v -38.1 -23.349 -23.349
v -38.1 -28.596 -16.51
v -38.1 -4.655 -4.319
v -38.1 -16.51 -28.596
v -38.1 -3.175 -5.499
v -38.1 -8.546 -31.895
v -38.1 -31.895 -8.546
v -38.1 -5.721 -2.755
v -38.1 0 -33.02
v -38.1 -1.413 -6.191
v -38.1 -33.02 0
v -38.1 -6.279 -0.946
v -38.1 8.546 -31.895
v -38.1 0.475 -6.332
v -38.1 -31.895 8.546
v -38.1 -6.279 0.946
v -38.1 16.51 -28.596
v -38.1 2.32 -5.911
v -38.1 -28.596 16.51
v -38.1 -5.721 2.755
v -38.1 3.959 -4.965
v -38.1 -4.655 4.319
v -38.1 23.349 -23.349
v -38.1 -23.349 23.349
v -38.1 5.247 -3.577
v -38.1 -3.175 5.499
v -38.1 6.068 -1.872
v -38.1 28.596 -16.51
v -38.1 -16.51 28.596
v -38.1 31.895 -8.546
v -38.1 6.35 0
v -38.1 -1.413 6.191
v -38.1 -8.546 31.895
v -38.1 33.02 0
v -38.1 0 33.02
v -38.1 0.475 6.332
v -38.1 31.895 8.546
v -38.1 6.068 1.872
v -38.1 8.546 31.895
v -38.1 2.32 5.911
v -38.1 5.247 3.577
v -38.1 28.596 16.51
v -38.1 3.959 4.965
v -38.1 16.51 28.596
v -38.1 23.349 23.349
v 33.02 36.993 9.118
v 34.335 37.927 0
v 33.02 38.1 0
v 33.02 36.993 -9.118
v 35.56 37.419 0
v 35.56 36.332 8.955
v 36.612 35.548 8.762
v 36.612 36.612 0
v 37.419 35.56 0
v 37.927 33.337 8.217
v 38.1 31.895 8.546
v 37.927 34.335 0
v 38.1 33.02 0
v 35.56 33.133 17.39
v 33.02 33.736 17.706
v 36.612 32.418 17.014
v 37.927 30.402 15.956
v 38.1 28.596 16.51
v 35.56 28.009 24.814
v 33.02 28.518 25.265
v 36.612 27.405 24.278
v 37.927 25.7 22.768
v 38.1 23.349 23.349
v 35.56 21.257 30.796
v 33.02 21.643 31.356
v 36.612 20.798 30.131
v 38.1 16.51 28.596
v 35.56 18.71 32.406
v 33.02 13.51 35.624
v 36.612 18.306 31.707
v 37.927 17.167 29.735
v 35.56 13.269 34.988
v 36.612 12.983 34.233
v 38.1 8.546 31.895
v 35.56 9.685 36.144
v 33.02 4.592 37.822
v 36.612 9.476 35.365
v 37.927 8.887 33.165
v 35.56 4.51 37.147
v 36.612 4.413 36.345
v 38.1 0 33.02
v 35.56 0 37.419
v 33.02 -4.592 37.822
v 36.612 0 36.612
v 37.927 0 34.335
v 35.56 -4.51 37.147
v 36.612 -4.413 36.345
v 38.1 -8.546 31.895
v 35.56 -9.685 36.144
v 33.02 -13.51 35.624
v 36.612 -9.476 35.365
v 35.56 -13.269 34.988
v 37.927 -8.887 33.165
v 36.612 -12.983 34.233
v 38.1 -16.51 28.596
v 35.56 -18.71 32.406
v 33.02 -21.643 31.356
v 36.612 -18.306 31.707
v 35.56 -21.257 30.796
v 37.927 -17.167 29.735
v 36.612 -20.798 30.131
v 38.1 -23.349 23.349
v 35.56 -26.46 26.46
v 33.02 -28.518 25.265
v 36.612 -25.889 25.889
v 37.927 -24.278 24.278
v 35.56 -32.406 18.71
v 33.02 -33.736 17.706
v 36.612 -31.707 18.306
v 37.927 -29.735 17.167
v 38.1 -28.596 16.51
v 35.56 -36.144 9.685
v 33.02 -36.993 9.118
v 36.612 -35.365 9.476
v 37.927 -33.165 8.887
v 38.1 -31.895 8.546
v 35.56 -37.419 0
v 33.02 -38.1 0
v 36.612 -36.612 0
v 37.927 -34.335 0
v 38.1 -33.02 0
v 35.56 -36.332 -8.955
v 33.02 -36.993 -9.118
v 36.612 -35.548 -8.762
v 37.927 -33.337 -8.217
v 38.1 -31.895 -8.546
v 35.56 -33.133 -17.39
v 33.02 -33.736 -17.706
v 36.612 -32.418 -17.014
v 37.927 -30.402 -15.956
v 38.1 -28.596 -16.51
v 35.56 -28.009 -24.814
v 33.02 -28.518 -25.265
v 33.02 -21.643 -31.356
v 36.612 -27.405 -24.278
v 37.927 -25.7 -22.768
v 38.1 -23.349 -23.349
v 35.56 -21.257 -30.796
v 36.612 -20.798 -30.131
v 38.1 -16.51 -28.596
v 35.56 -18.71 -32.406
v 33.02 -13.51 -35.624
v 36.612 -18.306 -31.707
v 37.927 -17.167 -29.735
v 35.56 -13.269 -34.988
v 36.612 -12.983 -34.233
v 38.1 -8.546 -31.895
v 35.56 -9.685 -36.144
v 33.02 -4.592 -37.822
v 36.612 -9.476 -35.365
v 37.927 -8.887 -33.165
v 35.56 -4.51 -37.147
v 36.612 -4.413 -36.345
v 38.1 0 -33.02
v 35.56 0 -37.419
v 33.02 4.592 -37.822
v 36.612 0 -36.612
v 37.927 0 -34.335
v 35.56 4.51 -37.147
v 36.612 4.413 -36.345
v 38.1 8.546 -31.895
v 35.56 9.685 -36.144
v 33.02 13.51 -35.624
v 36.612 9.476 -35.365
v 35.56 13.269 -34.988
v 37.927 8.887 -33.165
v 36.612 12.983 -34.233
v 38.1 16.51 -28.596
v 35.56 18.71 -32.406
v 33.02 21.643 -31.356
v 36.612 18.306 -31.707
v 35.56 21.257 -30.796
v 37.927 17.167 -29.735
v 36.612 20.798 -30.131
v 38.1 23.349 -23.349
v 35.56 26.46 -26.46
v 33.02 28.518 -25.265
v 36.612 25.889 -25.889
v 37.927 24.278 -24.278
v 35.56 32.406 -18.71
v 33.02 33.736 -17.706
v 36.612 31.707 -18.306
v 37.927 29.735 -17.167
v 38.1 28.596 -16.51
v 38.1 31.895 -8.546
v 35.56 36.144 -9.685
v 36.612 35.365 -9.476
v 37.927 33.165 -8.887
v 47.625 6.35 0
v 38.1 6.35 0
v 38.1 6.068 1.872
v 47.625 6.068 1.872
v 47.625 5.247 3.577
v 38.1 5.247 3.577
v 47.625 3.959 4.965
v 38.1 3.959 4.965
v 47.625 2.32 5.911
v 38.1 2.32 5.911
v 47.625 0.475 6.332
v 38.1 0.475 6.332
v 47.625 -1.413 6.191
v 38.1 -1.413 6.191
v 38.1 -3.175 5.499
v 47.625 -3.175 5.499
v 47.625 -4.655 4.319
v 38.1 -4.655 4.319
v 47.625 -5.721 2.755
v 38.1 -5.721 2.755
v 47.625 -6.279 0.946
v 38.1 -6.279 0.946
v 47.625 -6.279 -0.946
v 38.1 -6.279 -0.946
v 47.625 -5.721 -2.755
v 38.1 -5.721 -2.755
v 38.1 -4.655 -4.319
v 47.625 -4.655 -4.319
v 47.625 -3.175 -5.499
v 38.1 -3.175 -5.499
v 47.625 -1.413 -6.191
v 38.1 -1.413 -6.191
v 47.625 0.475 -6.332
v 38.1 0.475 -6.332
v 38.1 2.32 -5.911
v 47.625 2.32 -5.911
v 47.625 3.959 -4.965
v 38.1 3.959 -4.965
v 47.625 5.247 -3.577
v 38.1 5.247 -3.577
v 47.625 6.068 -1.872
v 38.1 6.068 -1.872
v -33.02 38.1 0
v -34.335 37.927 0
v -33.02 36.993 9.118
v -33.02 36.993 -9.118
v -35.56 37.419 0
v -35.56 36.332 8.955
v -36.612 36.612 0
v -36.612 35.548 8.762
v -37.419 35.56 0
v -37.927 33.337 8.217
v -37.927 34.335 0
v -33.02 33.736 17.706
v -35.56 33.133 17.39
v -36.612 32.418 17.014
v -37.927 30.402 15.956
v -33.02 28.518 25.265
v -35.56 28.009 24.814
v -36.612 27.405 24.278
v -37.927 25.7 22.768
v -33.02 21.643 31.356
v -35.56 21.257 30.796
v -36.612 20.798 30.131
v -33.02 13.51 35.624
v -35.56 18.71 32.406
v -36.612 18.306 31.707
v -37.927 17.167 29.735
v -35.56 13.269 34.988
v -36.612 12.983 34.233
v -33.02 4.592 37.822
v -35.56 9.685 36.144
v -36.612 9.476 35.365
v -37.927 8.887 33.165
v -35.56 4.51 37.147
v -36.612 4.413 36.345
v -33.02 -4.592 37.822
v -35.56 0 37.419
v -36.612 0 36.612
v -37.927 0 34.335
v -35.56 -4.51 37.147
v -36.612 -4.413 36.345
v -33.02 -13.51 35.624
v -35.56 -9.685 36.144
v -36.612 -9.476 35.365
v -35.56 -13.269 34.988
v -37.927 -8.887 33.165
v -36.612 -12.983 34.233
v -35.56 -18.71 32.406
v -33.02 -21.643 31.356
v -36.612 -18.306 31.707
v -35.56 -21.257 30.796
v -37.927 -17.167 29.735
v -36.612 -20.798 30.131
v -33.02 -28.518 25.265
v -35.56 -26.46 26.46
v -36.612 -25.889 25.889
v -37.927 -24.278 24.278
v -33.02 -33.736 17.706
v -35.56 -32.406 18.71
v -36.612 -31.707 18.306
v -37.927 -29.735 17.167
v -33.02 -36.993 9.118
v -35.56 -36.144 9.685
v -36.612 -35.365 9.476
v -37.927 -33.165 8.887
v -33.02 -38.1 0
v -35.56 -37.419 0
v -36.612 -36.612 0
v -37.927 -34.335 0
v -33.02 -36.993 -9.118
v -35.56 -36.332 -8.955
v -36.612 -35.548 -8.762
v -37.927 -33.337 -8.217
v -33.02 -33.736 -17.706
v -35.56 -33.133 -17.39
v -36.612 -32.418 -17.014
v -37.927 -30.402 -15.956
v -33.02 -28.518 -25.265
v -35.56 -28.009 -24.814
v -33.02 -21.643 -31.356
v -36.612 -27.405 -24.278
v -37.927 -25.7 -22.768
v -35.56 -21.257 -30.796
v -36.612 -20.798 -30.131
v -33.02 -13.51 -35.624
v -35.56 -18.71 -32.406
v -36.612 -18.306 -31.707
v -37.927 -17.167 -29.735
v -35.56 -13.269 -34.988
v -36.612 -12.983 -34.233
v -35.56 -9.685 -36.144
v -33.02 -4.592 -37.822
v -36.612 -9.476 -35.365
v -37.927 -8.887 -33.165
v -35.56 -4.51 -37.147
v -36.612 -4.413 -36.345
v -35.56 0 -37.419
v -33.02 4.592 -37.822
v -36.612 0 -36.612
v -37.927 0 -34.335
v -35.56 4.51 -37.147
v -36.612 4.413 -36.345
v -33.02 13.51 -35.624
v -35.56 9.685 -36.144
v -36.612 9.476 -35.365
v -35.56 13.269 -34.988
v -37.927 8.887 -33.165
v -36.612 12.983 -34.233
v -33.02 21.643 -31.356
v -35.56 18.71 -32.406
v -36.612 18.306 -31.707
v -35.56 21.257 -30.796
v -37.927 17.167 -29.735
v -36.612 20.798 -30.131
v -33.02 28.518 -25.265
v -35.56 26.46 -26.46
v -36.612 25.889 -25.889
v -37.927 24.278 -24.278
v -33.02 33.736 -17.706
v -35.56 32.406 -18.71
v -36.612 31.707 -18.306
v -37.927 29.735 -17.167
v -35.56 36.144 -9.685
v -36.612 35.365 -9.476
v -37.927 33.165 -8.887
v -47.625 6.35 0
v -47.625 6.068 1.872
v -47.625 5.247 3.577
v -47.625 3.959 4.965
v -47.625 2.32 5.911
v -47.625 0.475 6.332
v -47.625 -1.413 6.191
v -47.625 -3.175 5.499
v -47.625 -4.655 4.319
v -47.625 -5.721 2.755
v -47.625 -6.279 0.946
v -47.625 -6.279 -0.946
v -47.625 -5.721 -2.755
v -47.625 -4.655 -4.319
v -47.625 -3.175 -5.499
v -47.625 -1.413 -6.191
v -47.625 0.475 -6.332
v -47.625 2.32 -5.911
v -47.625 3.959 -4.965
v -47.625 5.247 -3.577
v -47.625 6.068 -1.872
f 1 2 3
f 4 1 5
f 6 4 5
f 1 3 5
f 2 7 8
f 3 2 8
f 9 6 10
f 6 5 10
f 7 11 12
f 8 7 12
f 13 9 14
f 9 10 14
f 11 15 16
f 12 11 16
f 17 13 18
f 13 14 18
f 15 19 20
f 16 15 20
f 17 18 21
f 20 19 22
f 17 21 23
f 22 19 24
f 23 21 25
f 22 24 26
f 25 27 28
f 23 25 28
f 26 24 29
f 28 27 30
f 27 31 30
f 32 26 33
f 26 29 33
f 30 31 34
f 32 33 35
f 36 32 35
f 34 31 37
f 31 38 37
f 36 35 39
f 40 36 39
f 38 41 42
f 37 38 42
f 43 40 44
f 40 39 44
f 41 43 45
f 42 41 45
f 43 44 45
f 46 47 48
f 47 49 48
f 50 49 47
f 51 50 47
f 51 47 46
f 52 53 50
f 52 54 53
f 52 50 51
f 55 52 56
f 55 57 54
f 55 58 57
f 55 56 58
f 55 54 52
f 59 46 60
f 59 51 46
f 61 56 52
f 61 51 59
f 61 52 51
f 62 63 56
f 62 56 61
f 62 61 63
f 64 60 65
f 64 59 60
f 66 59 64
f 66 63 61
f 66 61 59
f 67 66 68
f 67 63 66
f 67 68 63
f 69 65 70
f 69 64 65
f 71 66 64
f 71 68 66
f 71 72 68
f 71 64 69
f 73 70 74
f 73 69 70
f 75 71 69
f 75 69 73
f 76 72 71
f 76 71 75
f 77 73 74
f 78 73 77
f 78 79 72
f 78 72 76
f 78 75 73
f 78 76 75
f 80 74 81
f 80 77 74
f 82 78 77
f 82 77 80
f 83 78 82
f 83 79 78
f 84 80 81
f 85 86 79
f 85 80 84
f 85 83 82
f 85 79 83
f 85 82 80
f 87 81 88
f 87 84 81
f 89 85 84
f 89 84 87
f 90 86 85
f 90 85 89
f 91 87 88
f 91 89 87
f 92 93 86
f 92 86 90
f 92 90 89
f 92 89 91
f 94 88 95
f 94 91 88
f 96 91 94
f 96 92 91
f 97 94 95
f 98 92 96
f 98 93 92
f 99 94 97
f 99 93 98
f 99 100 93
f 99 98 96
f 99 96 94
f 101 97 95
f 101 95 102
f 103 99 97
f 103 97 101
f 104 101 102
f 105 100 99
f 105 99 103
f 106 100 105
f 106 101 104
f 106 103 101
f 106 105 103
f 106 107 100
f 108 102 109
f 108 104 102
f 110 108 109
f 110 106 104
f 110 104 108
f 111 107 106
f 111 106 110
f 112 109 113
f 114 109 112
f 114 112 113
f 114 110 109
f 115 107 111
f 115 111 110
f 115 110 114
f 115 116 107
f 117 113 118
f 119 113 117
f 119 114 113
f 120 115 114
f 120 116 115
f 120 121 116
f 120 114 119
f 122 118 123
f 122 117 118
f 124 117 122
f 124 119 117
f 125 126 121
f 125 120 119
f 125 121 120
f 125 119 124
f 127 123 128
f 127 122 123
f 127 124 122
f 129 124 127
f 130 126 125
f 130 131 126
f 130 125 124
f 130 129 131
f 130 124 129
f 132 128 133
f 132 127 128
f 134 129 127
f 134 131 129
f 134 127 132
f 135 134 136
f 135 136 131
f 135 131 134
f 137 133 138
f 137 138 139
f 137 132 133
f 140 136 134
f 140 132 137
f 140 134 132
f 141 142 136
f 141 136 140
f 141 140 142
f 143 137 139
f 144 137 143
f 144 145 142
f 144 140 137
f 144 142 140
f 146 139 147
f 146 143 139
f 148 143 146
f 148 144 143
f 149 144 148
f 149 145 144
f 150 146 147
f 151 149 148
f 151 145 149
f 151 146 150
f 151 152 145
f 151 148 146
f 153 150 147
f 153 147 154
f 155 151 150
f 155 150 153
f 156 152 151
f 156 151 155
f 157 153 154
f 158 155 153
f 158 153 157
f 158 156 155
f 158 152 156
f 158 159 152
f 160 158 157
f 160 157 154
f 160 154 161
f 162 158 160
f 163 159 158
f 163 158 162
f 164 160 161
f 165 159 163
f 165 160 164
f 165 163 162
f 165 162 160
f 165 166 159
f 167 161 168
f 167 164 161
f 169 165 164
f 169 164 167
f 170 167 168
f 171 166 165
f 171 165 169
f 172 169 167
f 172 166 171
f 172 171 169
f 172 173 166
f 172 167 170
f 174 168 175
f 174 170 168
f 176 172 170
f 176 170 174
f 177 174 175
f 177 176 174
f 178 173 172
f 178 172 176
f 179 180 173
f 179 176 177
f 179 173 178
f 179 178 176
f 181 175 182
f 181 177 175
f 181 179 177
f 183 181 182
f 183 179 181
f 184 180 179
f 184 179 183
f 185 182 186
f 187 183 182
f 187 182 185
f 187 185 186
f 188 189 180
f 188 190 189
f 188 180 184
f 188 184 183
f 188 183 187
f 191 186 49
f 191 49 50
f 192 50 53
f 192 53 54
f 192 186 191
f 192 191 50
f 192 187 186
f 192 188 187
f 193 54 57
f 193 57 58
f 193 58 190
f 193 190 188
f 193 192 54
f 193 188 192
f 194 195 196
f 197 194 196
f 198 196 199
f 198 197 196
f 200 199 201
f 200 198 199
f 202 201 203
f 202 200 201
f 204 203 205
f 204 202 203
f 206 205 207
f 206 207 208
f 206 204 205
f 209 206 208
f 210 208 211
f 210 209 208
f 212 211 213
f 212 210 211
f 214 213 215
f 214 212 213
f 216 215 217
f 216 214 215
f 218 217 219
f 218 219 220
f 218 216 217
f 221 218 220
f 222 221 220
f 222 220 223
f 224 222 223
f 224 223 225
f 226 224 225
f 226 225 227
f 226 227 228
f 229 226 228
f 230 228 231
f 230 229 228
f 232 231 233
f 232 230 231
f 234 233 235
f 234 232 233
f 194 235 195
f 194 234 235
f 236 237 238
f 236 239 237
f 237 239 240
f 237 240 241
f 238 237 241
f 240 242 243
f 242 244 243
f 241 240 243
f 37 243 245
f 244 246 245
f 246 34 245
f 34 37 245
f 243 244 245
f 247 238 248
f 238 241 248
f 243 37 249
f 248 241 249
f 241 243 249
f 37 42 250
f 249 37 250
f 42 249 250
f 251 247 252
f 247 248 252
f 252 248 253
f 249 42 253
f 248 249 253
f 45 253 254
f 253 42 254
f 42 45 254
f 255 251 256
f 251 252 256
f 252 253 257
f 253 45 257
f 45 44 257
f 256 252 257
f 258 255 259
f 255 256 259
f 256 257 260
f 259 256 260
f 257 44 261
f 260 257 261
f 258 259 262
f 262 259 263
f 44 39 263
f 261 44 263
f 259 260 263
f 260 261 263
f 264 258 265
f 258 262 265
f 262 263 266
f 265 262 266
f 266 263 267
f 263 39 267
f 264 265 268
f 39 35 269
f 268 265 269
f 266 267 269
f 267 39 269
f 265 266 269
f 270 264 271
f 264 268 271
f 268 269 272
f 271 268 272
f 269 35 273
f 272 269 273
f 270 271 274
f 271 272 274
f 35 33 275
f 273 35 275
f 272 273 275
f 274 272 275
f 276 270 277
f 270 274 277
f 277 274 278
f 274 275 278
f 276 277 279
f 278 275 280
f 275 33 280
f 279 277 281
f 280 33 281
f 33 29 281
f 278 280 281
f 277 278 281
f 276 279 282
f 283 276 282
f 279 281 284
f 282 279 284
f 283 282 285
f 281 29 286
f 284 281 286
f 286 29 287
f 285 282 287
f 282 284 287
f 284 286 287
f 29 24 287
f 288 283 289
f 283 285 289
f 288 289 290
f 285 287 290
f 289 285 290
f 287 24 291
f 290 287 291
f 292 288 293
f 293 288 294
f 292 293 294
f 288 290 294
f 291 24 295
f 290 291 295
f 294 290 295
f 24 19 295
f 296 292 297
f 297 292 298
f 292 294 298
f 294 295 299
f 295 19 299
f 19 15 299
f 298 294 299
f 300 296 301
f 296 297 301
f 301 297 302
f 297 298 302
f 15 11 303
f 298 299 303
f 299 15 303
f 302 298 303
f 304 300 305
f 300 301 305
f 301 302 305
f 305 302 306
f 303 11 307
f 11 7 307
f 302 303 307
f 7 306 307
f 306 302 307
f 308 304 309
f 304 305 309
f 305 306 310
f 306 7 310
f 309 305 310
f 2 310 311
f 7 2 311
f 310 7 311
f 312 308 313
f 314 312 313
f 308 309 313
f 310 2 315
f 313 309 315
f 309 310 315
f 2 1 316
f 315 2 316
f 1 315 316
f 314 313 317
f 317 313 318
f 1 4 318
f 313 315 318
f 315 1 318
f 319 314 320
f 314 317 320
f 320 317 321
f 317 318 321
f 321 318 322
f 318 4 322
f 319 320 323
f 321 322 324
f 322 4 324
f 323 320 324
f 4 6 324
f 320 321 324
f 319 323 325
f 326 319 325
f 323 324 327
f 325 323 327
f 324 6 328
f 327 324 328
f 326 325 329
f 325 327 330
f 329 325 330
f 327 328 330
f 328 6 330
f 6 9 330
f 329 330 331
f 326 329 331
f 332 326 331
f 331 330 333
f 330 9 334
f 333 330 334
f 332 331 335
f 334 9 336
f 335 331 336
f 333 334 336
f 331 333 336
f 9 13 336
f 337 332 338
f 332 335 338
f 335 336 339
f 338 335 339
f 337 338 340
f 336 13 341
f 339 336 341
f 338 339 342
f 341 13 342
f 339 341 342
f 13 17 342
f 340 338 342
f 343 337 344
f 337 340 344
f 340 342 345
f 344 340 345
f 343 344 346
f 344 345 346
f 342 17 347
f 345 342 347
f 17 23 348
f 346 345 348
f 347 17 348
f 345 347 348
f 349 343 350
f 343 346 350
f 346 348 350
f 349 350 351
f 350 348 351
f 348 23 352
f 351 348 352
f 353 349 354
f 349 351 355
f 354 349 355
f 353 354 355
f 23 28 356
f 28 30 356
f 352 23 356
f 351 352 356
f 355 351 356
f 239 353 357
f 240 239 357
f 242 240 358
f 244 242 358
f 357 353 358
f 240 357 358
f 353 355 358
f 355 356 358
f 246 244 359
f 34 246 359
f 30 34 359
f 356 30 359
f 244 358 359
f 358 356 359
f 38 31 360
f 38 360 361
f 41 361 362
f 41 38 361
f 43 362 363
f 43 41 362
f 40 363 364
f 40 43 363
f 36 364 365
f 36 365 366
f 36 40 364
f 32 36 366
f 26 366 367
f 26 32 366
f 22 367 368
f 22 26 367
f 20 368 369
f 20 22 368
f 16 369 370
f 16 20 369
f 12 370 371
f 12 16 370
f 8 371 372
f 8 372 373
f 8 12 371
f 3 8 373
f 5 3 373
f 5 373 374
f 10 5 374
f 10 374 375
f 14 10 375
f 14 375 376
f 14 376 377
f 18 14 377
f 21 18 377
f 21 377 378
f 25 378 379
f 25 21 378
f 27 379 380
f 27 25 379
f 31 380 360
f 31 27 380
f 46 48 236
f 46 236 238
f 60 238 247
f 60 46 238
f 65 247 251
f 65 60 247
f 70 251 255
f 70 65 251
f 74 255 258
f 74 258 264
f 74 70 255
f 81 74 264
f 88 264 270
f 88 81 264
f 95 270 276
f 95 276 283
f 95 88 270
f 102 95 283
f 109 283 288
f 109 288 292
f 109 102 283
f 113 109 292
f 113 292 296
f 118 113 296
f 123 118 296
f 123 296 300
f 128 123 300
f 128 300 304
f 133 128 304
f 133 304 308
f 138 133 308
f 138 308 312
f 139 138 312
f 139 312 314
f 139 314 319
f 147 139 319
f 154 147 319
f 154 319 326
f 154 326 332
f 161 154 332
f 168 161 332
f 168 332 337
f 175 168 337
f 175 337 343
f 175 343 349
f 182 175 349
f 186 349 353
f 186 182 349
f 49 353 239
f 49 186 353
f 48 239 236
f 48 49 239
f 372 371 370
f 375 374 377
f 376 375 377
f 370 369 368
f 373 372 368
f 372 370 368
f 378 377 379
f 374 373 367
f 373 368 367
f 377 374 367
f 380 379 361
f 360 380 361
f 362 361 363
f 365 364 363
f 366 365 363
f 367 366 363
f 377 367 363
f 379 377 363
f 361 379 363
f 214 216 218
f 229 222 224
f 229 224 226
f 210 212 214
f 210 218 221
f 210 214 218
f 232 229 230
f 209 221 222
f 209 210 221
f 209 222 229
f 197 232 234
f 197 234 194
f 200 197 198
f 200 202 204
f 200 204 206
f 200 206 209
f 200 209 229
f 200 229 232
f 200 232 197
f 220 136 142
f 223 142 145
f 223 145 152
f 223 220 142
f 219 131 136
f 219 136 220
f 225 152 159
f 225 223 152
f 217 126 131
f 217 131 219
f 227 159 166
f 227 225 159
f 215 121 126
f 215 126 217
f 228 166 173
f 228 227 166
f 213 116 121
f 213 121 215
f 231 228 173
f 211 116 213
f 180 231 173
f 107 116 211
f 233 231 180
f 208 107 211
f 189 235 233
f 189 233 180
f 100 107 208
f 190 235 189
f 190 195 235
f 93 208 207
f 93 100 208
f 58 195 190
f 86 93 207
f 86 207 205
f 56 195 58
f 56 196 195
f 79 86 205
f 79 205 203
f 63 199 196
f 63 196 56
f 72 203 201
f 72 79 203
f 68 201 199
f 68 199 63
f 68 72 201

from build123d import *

# Parameters (mm, degrees)
F0_R     = 38.1
F0_R_2   = 6.35
F1_DEPTH = 38.1
F2_R     = 5.08
F3_DEPTH = 47.625


with BuildPart() as f1:
    # F0 (on Right) → F1 (new body, symmetric)
    with BuildSketch(Plane.YZ):
        Circle(F0_R)
        Circle(F0_R_2, mode=Mode.SUBTRACT)
    extrude(amount=F1_DEPTH, both=True)

    # F2
    f2_edges = [f1.edges().sort_by_distance(p)[0] for p in [
        (38.1, -38.1, 0),
        (-38.1, -38.1, 0),
    ]]
    fillet(f2_edges, radius=F2_R)

    # F0 (on Right) → F3 (join, symmetric)
    with BuildSketch(Plane.YZ):
        Circle(F0_R_2)
    extrude(amount=F3_DEPTH, both=True)


solid = f1.part
